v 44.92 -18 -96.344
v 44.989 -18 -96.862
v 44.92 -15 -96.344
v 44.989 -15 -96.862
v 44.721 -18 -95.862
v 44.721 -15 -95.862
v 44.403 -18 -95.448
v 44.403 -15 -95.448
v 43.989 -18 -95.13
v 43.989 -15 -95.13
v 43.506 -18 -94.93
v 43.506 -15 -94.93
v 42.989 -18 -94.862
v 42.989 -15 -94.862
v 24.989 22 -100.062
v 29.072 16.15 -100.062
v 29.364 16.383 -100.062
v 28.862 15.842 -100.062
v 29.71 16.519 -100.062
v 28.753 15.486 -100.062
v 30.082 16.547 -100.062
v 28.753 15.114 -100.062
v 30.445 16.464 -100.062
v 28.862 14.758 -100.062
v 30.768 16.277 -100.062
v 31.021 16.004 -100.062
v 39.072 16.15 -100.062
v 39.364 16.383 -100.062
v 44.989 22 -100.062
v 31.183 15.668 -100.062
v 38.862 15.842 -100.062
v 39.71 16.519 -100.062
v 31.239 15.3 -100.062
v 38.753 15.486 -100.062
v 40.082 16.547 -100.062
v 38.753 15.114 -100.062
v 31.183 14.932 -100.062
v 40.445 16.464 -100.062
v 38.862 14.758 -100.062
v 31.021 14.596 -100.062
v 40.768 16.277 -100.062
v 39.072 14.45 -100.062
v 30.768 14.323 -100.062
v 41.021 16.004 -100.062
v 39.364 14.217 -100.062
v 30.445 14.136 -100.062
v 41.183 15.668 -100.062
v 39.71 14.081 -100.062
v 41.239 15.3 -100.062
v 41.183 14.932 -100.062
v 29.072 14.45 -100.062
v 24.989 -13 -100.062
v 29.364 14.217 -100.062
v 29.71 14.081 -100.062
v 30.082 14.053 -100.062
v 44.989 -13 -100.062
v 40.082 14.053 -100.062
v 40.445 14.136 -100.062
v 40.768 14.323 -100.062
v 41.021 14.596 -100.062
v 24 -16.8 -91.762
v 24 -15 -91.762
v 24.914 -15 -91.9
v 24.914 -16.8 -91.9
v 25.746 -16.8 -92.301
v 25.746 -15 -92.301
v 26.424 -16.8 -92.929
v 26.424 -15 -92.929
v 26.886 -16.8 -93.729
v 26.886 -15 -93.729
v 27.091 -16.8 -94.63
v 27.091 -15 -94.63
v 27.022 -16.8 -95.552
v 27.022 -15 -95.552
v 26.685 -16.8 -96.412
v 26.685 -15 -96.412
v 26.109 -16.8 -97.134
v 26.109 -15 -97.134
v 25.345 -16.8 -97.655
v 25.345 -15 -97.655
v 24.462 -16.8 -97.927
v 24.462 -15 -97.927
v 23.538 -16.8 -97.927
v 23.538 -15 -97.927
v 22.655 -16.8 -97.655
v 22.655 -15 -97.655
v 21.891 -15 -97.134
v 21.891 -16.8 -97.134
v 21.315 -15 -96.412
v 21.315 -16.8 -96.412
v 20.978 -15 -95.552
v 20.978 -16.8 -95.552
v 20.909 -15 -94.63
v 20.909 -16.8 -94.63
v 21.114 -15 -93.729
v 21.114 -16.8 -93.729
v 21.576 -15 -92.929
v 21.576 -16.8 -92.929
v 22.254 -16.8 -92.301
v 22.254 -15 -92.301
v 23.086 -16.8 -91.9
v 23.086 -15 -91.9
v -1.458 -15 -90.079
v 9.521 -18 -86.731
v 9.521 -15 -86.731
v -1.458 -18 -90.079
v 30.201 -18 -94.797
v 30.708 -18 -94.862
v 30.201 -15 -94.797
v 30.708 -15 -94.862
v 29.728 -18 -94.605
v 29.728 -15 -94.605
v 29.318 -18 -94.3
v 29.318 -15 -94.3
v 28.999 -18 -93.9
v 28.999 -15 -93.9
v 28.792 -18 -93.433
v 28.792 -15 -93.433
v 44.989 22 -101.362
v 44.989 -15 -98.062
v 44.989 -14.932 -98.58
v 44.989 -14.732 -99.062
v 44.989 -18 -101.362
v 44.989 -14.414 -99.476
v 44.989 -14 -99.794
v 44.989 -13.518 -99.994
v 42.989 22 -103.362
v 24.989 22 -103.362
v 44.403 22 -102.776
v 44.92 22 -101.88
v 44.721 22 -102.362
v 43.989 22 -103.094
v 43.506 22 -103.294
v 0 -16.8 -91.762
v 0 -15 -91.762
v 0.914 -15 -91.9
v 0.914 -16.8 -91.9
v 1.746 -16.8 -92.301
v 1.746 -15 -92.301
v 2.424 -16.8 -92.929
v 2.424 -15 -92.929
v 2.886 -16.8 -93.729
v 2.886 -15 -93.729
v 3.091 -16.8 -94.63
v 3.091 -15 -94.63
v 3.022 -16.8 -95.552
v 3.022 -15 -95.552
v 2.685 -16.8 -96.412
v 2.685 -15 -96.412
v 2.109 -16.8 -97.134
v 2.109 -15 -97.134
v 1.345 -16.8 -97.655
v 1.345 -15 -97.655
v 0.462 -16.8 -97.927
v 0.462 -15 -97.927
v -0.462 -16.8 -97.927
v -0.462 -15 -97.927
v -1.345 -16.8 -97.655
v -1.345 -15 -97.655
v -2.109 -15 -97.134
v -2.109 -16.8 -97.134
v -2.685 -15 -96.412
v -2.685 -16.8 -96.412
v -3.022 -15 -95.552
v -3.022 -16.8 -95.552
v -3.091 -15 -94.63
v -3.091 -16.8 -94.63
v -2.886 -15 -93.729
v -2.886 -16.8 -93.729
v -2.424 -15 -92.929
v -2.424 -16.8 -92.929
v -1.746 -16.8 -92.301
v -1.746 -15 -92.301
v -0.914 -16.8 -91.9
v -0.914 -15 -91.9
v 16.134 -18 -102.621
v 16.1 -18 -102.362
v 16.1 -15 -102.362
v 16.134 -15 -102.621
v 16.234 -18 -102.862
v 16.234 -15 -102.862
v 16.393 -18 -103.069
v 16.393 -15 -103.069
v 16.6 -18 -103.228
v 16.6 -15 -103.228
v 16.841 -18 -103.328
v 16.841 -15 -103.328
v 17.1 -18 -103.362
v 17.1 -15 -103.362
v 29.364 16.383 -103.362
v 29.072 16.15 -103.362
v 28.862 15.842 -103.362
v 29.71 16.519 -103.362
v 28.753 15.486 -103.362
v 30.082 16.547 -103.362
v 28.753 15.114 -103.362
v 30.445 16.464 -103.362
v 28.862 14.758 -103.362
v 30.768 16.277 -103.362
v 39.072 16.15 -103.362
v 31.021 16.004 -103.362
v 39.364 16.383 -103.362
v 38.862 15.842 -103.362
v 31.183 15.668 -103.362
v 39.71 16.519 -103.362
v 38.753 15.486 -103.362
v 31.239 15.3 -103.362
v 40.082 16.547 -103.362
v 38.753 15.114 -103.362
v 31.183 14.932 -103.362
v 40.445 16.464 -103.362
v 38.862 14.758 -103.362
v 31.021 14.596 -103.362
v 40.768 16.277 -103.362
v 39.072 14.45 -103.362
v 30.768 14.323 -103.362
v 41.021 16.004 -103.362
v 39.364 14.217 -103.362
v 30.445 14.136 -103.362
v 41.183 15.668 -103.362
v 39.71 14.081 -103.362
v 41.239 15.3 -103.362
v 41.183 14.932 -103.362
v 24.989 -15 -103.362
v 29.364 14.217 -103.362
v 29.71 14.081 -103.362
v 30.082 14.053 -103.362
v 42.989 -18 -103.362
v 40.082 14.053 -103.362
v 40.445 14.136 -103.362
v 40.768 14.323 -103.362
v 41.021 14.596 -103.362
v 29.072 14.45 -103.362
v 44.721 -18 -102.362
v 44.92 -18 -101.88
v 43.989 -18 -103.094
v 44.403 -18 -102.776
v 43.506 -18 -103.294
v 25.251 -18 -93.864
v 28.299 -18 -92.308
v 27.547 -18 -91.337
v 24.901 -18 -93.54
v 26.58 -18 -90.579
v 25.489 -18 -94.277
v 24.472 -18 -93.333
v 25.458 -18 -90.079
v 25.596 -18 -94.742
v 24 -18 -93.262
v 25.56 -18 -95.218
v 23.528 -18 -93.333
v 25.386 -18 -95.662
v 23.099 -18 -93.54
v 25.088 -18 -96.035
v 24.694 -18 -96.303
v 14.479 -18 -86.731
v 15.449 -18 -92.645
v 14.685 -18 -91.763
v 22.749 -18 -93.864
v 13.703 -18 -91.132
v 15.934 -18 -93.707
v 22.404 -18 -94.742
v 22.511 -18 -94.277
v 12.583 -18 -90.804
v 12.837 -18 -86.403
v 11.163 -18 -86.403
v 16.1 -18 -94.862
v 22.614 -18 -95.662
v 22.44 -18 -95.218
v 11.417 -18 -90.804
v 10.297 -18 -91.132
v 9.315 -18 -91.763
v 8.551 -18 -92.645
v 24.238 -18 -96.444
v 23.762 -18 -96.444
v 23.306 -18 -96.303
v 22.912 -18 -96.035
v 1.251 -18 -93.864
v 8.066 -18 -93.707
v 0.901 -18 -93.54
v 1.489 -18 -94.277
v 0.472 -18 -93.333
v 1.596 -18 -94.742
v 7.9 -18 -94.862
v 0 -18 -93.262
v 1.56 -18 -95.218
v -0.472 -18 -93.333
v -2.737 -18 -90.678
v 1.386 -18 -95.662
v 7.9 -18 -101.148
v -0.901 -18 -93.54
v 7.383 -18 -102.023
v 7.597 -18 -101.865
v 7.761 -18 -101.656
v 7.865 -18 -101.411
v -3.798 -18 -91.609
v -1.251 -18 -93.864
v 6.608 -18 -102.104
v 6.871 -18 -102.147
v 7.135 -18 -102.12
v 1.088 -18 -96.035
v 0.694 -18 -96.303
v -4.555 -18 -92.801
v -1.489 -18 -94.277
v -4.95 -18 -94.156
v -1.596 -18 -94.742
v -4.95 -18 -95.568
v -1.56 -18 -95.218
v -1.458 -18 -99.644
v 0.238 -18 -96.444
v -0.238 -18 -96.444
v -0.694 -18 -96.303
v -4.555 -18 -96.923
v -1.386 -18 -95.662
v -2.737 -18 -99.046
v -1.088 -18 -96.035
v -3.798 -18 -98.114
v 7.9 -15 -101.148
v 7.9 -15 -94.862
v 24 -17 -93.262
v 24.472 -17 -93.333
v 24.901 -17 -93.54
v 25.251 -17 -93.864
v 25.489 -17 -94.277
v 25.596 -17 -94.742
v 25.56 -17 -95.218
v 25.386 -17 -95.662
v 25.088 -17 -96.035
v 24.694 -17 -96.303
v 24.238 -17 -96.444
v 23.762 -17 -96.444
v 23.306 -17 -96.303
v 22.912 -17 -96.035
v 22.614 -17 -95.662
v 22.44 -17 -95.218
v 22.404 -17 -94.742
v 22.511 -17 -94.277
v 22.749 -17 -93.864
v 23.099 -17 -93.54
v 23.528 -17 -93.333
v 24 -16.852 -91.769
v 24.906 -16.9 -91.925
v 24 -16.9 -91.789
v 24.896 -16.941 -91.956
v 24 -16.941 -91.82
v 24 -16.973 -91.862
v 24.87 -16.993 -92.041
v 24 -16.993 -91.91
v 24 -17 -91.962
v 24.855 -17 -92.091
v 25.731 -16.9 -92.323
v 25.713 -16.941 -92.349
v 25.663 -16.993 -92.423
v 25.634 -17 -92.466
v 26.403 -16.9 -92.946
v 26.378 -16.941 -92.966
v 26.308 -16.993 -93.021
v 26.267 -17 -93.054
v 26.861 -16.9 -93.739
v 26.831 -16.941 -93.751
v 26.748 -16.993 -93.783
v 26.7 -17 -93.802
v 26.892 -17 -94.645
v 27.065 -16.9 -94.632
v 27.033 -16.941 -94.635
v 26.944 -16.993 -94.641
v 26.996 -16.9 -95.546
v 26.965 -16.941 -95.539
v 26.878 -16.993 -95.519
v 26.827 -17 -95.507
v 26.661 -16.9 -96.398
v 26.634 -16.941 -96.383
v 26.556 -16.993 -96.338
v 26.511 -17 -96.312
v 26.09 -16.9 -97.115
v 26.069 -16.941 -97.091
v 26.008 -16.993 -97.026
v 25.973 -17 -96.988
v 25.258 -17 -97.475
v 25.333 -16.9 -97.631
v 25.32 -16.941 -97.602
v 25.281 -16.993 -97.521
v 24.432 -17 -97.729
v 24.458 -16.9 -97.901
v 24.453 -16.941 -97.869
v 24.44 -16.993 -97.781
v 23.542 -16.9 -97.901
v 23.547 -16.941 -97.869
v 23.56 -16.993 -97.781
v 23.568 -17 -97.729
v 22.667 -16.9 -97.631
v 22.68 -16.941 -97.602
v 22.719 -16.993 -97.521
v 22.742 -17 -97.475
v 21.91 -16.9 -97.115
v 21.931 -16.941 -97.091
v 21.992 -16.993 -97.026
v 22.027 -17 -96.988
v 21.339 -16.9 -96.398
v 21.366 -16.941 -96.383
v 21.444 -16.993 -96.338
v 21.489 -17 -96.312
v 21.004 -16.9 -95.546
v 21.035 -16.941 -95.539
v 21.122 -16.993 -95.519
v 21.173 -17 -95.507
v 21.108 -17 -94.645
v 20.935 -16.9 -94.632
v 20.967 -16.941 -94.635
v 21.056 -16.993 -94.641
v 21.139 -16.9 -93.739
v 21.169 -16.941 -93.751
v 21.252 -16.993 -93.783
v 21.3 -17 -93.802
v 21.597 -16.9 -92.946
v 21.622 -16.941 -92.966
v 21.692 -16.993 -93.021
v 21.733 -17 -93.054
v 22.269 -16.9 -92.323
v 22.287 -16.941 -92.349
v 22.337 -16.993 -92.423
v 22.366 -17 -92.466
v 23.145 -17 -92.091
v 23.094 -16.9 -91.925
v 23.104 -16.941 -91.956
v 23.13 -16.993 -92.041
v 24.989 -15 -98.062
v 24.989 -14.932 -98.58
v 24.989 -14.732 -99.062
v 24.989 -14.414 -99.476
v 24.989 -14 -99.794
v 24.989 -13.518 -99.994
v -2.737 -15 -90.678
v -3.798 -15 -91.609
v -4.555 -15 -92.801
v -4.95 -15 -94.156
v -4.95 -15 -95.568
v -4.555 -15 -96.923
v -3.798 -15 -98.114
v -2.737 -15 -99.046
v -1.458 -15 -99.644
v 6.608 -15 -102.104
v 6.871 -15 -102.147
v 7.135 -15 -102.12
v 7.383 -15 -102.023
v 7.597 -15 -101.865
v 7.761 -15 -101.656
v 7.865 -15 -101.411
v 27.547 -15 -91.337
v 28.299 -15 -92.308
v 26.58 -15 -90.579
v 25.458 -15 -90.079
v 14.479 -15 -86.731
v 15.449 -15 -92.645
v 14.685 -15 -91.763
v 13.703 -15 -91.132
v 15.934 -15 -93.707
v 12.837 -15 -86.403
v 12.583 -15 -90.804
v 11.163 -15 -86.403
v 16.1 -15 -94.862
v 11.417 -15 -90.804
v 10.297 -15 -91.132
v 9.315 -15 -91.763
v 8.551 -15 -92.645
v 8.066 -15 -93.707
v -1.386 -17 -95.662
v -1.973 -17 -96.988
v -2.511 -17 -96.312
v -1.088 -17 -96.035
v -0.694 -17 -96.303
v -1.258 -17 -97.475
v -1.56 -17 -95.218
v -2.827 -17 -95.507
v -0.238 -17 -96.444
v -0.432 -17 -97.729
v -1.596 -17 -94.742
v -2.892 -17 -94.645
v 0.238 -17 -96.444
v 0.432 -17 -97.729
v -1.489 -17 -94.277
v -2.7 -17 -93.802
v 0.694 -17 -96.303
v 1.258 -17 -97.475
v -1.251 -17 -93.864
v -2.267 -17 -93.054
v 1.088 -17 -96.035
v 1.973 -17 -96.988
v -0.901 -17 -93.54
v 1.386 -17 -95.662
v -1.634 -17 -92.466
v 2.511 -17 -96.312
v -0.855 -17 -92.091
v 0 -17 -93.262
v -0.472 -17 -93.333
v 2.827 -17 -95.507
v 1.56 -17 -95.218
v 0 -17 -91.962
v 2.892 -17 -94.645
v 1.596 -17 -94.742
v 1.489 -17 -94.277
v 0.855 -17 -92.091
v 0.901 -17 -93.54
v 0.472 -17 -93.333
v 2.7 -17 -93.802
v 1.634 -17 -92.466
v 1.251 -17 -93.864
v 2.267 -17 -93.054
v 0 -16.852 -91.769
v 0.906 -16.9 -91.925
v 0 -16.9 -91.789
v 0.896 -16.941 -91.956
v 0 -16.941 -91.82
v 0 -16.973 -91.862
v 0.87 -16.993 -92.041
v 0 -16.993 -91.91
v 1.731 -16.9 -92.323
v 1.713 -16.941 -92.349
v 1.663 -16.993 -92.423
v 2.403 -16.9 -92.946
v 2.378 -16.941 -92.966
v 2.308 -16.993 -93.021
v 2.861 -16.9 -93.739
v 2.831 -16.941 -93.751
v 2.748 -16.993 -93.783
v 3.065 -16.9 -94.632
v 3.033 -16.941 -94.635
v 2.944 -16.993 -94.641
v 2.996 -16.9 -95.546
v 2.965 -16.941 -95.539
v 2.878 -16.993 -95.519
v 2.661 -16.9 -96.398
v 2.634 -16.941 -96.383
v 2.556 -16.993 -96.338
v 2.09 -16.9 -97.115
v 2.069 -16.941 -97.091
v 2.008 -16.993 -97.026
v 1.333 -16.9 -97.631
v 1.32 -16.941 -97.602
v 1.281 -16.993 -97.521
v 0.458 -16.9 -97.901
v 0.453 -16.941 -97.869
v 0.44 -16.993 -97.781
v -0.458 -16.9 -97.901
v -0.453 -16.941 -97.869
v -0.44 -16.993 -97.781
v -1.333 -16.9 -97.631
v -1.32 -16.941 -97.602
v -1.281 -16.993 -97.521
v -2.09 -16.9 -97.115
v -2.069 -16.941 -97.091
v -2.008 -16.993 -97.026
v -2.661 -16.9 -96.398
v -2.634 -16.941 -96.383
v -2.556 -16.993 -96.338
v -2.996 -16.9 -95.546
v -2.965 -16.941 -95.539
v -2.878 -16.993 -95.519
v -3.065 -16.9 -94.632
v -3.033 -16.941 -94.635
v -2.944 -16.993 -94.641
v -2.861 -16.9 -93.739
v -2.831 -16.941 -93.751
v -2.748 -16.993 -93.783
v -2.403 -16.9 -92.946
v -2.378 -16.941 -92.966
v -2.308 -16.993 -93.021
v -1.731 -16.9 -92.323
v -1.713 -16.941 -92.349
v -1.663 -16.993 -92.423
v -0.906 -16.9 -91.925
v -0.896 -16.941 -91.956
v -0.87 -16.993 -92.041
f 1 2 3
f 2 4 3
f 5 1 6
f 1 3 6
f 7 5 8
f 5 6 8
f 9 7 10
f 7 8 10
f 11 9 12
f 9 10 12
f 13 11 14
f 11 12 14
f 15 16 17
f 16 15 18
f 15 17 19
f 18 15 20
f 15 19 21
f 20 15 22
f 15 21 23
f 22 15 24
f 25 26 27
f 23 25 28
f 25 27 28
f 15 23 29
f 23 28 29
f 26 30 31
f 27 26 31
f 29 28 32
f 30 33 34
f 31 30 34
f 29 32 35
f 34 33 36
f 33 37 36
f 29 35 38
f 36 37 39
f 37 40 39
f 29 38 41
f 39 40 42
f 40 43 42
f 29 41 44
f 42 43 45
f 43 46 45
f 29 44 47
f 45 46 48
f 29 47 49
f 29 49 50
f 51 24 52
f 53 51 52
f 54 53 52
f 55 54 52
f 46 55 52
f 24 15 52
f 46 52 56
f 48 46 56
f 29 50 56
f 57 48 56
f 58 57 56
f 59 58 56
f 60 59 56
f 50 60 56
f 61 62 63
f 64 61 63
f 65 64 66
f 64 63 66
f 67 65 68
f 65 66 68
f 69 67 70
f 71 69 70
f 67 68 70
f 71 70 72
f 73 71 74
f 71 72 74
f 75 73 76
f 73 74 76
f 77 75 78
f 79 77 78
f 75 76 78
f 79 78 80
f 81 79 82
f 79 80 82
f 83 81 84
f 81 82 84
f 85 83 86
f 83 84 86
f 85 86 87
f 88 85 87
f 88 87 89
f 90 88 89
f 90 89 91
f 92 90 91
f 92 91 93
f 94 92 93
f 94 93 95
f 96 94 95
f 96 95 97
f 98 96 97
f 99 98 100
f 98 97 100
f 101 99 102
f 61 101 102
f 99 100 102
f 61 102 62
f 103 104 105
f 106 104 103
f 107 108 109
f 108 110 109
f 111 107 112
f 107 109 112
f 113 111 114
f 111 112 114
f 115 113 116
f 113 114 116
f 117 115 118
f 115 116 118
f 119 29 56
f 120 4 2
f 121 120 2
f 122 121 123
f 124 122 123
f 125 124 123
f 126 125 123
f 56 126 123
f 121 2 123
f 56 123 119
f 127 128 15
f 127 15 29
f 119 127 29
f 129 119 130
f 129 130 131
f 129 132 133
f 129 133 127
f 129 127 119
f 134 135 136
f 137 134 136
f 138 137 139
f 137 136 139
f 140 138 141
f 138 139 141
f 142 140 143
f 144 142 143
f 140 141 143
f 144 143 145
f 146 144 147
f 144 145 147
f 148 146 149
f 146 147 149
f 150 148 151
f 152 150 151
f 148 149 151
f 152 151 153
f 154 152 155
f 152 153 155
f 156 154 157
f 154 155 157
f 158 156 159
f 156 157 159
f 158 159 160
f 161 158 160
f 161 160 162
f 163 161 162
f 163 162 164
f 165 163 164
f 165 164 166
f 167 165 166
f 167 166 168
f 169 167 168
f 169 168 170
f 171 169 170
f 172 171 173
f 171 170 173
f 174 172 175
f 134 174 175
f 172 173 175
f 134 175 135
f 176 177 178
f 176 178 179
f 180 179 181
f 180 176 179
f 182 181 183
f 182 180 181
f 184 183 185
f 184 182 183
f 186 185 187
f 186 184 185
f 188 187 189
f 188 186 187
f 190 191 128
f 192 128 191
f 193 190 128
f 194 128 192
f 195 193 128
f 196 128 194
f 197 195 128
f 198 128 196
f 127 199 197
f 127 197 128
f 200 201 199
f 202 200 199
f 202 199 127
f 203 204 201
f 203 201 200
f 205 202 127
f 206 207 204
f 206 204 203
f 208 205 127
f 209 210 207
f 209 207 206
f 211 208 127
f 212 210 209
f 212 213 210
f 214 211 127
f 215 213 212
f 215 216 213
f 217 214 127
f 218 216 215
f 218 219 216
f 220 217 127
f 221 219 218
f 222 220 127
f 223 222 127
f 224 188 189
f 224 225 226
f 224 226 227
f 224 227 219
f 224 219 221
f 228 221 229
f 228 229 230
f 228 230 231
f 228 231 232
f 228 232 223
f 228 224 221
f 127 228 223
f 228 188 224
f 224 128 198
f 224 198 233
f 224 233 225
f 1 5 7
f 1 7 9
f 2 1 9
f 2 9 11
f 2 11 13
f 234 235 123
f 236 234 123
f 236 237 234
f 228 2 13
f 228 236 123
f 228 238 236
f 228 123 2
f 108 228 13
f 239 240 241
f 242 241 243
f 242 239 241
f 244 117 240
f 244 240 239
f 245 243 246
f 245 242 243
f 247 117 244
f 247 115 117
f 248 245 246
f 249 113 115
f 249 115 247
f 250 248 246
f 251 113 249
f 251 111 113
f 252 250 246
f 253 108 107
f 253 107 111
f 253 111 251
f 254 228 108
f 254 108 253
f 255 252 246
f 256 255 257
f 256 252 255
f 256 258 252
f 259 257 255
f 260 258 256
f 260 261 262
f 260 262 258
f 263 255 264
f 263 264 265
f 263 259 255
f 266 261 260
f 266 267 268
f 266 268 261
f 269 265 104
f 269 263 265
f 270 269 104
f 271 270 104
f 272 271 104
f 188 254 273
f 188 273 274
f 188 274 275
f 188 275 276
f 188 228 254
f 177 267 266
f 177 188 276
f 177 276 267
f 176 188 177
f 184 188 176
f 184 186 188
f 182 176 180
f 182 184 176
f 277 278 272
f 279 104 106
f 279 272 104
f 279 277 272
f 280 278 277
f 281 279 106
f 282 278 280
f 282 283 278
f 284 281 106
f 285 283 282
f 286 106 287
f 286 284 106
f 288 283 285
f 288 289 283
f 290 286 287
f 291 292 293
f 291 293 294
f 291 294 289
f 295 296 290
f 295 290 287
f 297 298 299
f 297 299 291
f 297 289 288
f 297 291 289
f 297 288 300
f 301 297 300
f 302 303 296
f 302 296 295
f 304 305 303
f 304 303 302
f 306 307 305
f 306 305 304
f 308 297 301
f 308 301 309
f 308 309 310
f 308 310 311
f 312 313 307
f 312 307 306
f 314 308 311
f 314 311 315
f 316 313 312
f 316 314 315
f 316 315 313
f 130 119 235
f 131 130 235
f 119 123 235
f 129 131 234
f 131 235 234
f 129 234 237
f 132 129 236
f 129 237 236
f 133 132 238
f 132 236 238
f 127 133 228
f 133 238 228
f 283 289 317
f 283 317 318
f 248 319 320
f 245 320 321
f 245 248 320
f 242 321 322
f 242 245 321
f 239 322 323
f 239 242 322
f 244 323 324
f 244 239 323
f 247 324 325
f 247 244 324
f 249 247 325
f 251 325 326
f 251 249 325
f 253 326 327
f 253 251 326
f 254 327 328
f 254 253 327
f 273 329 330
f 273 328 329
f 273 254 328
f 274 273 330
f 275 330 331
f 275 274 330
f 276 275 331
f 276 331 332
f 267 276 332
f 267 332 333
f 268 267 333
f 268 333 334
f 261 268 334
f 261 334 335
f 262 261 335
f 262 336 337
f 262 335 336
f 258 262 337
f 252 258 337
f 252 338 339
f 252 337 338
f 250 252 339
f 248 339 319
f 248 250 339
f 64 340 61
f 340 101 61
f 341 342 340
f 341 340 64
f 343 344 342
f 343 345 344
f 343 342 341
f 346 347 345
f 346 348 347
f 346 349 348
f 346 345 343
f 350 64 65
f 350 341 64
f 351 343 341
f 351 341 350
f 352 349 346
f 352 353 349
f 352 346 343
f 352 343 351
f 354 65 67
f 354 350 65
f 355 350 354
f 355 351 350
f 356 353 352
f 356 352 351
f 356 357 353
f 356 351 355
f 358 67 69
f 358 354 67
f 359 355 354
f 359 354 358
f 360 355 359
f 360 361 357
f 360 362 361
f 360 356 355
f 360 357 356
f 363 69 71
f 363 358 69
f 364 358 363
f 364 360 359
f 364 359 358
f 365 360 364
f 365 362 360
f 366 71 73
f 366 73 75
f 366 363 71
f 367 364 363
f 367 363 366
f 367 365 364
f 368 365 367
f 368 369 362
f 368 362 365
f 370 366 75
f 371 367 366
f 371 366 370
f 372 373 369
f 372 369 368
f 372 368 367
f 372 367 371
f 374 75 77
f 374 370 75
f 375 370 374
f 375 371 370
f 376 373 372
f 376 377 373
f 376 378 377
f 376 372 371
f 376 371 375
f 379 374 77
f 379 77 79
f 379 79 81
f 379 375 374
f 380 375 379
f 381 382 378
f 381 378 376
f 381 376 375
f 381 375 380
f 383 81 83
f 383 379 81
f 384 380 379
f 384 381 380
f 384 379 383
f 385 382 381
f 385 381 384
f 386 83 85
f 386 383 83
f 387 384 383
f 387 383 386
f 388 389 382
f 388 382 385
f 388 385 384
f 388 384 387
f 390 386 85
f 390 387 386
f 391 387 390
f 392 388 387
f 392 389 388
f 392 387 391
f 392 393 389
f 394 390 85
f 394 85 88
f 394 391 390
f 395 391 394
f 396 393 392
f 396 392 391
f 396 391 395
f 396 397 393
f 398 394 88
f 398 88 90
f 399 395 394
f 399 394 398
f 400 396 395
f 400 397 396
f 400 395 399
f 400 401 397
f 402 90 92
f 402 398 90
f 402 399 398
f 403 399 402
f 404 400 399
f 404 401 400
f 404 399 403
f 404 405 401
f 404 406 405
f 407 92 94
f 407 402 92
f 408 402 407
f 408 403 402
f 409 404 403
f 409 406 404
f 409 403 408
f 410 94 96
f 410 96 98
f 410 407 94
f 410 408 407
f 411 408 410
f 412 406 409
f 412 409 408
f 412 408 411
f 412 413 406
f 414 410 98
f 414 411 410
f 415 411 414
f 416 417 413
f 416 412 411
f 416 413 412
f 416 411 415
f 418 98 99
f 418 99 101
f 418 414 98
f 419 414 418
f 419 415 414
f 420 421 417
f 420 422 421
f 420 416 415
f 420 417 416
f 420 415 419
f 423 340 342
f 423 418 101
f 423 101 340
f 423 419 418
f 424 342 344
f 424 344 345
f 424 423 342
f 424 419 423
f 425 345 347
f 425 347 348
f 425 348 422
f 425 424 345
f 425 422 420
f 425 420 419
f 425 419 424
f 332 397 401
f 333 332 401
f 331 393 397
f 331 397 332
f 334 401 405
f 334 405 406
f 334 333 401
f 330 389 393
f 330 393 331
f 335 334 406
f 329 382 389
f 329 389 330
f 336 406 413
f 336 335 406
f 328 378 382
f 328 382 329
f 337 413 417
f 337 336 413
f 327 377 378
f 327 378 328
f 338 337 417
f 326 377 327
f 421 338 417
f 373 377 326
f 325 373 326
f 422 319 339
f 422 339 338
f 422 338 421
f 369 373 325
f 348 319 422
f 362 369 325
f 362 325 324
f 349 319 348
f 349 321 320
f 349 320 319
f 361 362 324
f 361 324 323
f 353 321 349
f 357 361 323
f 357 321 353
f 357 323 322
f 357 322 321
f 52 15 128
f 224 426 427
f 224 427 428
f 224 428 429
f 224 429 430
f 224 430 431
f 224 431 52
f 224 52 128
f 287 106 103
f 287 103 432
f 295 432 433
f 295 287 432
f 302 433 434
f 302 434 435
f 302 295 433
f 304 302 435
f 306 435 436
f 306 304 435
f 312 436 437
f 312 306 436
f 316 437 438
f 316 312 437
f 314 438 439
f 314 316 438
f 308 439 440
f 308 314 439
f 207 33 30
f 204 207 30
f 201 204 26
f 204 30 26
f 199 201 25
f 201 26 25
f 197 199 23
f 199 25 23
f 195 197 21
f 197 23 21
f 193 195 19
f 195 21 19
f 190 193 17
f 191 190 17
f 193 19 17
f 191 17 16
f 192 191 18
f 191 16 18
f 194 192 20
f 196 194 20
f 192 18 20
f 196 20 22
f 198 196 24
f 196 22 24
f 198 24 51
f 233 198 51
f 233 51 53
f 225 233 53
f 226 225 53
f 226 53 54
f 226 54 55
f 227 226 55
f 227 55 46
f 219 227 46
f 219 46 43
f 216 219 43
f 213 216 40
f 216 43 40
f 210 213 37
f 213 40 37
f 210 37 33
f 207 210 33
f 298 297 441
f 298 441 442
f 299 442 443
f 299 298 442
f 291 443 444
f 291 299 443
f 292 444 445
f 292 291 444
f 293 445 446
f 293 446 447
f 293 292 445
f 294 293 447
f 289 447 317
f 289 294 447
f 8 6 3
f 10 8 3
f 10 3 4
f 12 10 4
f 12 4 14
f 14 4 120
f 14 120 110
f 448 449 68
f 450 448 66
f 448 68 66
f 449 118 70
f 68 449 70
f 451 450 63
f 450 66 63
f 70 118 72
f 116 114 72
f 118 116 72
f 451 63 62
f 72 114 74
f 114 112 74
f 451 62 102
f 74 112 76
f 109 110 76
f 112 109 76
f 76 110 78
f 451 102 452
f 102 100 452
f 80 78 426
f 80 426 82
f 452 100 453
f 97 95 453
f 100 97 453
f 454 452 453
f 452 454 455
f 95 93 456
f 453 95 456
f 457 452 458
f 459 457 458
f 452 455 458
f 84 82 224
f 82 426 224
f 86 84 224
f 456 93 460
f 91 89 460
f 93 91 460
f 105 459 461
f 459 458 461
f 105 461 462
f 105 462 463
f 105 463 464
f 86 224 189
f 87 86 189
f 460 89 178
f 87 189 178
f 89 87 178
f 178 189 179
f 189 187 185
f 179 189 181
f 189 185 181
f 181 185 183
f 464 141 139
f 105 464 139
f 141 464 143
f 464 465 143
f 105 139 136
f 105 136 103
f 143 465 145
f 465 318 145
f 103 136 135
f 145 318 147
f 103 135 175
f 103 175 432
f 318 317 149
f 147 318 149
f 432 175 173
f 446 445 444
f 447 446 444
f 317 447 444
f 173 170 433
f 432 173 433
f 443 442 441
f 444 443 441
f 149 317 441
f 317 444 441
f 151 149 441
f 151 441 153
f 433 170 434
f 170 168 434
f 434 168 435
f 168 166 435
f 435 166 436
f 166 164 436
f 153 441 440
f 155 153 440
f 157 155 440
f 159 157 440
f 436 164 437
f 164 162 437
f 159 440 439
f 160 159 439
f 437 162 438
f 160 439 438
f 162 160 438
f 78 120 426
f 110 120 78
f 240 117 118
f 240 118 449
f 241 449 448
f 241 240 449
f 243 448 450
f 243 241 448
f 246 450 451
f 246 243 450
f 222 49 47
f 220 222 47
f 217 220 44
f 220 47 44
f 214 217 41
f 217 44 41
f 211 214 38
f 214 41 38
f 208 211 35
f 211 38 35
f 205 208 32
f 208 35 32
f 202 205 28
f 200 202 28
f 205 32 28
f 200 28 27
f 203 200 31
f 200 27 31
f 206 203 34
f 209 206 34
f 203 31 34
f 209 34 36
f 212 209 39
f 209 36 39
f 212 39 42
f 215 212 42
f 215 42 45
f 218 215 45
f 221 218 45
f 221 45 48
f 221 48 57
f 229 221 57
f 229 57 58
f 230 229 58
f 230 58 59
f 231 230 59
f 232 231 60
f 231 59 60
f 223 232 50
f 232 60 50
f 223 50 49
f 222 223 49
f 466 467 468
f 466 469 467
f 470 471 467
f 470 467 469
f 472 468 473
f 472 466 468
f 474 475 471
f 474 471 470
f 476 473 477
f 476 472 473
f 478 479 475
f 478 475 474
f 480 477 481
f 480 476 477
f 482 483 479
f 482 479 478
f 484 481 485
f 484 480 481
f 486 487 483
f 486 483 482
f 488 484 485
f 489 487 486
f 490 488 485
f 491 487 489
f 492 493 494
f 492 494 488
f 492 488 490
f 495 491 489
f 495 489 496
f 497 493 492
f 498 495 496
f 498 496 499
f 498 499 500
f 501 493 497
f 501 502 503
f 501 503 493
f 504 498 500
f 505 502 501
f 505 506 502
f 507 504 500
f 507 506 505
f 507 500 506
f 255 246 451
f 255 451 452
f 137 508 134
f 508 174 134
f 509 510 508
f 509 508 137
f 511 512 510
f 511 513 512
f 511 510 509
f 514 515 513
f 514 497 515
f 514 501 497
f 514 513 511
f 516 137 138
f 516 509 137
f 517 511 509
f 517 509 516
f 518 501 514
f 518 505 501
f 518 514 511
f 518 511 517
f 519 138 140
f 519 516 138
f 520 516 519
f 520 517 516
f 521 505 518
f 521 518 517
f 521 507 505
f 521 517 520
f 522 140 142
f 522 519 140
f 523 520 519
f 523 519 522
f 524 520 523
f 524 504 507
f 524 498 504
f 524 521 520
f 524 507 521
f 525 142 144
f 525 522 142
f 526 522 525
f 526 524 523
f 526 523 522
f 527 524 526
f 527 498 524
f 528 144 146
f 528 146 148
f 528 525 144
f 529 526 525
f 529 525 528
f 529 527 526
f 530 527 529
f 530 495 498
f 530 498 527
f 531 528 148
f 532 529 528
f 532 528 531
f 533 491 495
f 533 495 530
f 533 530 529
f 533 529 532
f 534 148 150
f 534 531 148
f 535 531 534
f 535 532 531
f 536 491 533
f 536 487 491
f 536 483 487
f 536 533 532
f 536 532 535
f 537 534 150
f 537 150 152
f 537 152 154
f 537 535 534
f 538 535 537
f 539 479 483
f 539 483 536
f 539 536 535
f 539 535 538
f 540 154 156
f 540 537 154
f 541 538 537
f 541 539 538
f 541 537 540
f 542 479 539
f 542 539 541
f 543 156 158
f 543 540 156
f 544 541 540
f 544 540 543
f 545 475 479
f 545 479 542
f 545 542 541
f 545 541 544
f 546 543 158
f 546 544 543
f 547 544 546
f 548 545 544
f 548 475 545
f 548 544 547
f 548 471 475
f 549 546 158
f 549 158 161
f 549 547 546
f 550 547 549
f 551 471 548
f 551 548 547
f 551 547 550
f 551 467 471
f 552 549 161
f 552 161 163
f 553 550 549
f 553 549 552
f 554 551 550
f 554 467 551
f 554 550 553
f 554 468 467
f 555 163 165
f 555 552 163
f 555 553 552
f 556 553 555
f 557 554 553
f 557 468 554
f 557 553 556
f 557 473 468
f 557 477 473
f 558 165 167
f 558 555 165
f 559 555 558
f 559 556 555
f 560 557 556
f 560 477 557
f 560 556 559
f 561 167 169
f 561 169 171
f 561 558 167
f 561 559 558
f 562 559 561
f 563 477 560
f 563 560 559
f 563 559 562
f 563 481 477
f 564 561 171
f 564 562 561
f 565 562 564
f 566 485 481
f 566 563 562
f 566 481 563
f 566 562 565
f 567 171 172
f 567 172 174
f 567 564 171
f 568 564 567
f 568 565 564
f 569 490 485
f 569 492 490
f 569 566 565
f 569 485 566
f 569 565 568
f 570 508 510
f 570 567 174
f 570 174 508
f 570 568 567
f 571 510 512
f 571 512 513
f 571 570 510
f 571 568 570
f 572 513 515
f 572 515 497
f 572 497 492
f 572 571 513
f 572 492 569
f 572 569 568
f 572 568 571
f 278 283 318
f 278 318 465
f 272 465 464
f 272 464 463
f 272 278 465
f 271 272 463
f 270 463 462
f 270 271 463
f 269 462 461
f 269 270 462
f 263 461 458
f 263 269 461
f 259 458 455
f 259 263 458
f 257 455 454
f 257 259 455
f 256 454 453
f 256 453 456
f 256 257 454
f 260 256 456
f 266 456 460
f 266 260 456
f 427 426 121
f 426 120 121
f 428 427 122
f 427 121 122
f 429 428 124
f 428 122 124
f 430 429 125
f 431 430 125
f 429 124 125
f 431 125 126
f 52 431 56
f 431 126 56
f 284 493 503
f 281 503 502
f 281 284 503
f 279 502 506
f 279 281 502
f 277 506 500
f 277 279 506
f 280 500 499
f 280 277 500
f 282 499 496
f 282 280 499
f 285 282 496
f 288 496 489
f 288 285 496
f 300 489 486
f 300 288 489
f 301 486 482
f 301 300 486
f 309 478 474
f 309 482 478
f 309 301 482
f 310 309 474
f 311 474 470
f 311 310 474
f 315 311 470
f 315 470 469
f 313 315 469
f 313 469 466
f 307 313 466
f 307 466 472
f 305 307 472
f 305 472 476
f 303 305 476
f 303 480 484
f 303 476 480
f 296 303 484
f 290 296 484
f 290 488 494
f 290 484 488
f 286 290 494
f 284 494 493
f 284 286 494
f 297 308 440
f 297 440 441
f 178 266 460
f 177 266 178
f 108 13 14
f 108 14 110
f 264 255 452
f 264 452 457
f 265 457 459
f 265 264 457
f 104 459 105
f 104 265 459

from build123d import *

# Parameters (mm, degrees)
SKETCH_1_R          = 1.6
EXTRUDE_1_DEPTH     = 3
SKETCH_2_R          = 3.1
CUT_EXTRUDE_1_DEPTH = 2
FILLET_1_R          = 0.2
SKETCH_4_W          = 20
SKETCH_4_H          = 3.3
EXTRUDE_2_DEPTH     = 37
FILLET_2_R          = 2
SKETCH_5_R          = 1.25
CUT_EXTRUDE_2_DEPTH = 3.3


with BuildPart() as part:
    # Эскиз1 → Бобышка-Вытянуть1 (new body)
    with BuildSketch(Plane(origin=(0, -18, 0), x_dir=(1, 0, 0), z_dir=(0, 1, 0))):
        with BuildLine():
            Line((9.520833333, 86.731463811), (-1.458333333, 90.079283893))
            ThreePointArc((-1.458333333, 90.079283893), (-5, 94.861884011), (-1.458333333, 99.644484129))
            Line((-1.458333333, 99.644484129), (6.608333333, 102.104210763))
            ThreePointArc((6.608333333, 102.104210763), (7.495119036, 101.951328303), (7.9, 101.14769074))
            Line((7.9, 101.14769074), (7.9, 94.861884011))
            ThreePointArc((7.9, 94.861884011), (12, 90.761884011), (16.1, 94.861884011))
            Line((16.1, 94.861884011), (16.1, 102.361884011))
            ThreePointArc((16.1, 102.361884011), (16.392893219, 103.068990793), (17.1, 103.361884011))
            Line((17.1, 103.361884011), (44.988630488, 103.361884011))
            Line((44.988630488, 103.361884011), (44.988630488, 94.861884011))
            Line((44.988630488, 94.861884011), (29, 94.861884011))
            ThreePointArc((29, 94.861884011), (28.018187817, 91.886288833), (25.458333333, 90.079283893))
            Line((25.458333333, 90.079283893), (14.479166667, 86.731463811))
            ThreePointArc((14.479166667, 86.731463811), (12, 86.361884011), (9.520833333, 86.731463811))
        make_face()
        with Locations(Location((24, 94.861884011, 0), (0, 0, 270))):
            Circle(SKETCH_1_R, mode=Mode.SUBTRACT)
        with Locations(Location((0, 94.861884011, 0), (0, 0, 270))):
            Circle(SKETCH_1_R, mode=Mode.SUBTRACT)
    extrude(amount=EXTRUDE_1_DEPTH)

    # Эскиз2 → Вырез-Вытянуть1 (cut)
    with BuildSketch(Plane(origin=(0, -15, 0), x_dir=(1, 0, 0), z_dir=(0, 1, 0))):
        with Locations(Location((0, 94.861884011, 0), (0, 0, 270))):
            Circle(SKETCH_2_R)
        with Locations(Location((24, 94.861884011, 0), (0, 0, 270))):
            Circle(SKETCH_2_R)
    extrude(amount=-CUT_EXTRUDE_1_DEPTH, mode=Mode.SUBTRACT)

    # Скругление1
    fillet_1_edges = [part.edges().sort_by_distance(p)[0] for p in [
        (0, -17, -97.961884011),
        (24, -17, -97.961884011),
    ]]
    fillet(fillet_1_edges, radius=FILLET_1_R)

    # Эскиз4 → Бобышка-Вытянуть2 (add)
    with BuildSketch(Plane(origin=(0, -15, 0), x_dir=(1, 0, 0), z_dir=(0, 1, 0))):
        with Locations((34.988630488, 101.711884011)):
            Rectangle(SKETCH_4_W, SKETCH_4_H)
    extrude(amount=EXTRUDE_2_DEPTH)

    # Скругление2
    fillet_2_edges = [part.edges().sort_by_distance(p)[0] for p in [
        (44.988630488, 2, -103.361884011),
        (44.988630488, -16.5, -94.861884011),
        (29, -16.5, -94.861884011),
        (34.988630488, -15, -100.061884011),
    ]]
    fillet(fillet_2_edges, radius=FILLET_2_R)

    # Эскиз5 → Вырез-Вытянуть2 (cut)
    with BuildSketch(Plane.XY.offset(-100.061884011)):
        with Locations((39.988630488, 15.3)):
            Circle(SKETCH_5_R)
        with Locations((29.988630488, 15.3)):
            Circle(SKETCH_5_R)
    extrude(amount=-CUT_EXTRUDE_2_DEPTH, mode=Mode.SUBTRACT)


solid = part.part
